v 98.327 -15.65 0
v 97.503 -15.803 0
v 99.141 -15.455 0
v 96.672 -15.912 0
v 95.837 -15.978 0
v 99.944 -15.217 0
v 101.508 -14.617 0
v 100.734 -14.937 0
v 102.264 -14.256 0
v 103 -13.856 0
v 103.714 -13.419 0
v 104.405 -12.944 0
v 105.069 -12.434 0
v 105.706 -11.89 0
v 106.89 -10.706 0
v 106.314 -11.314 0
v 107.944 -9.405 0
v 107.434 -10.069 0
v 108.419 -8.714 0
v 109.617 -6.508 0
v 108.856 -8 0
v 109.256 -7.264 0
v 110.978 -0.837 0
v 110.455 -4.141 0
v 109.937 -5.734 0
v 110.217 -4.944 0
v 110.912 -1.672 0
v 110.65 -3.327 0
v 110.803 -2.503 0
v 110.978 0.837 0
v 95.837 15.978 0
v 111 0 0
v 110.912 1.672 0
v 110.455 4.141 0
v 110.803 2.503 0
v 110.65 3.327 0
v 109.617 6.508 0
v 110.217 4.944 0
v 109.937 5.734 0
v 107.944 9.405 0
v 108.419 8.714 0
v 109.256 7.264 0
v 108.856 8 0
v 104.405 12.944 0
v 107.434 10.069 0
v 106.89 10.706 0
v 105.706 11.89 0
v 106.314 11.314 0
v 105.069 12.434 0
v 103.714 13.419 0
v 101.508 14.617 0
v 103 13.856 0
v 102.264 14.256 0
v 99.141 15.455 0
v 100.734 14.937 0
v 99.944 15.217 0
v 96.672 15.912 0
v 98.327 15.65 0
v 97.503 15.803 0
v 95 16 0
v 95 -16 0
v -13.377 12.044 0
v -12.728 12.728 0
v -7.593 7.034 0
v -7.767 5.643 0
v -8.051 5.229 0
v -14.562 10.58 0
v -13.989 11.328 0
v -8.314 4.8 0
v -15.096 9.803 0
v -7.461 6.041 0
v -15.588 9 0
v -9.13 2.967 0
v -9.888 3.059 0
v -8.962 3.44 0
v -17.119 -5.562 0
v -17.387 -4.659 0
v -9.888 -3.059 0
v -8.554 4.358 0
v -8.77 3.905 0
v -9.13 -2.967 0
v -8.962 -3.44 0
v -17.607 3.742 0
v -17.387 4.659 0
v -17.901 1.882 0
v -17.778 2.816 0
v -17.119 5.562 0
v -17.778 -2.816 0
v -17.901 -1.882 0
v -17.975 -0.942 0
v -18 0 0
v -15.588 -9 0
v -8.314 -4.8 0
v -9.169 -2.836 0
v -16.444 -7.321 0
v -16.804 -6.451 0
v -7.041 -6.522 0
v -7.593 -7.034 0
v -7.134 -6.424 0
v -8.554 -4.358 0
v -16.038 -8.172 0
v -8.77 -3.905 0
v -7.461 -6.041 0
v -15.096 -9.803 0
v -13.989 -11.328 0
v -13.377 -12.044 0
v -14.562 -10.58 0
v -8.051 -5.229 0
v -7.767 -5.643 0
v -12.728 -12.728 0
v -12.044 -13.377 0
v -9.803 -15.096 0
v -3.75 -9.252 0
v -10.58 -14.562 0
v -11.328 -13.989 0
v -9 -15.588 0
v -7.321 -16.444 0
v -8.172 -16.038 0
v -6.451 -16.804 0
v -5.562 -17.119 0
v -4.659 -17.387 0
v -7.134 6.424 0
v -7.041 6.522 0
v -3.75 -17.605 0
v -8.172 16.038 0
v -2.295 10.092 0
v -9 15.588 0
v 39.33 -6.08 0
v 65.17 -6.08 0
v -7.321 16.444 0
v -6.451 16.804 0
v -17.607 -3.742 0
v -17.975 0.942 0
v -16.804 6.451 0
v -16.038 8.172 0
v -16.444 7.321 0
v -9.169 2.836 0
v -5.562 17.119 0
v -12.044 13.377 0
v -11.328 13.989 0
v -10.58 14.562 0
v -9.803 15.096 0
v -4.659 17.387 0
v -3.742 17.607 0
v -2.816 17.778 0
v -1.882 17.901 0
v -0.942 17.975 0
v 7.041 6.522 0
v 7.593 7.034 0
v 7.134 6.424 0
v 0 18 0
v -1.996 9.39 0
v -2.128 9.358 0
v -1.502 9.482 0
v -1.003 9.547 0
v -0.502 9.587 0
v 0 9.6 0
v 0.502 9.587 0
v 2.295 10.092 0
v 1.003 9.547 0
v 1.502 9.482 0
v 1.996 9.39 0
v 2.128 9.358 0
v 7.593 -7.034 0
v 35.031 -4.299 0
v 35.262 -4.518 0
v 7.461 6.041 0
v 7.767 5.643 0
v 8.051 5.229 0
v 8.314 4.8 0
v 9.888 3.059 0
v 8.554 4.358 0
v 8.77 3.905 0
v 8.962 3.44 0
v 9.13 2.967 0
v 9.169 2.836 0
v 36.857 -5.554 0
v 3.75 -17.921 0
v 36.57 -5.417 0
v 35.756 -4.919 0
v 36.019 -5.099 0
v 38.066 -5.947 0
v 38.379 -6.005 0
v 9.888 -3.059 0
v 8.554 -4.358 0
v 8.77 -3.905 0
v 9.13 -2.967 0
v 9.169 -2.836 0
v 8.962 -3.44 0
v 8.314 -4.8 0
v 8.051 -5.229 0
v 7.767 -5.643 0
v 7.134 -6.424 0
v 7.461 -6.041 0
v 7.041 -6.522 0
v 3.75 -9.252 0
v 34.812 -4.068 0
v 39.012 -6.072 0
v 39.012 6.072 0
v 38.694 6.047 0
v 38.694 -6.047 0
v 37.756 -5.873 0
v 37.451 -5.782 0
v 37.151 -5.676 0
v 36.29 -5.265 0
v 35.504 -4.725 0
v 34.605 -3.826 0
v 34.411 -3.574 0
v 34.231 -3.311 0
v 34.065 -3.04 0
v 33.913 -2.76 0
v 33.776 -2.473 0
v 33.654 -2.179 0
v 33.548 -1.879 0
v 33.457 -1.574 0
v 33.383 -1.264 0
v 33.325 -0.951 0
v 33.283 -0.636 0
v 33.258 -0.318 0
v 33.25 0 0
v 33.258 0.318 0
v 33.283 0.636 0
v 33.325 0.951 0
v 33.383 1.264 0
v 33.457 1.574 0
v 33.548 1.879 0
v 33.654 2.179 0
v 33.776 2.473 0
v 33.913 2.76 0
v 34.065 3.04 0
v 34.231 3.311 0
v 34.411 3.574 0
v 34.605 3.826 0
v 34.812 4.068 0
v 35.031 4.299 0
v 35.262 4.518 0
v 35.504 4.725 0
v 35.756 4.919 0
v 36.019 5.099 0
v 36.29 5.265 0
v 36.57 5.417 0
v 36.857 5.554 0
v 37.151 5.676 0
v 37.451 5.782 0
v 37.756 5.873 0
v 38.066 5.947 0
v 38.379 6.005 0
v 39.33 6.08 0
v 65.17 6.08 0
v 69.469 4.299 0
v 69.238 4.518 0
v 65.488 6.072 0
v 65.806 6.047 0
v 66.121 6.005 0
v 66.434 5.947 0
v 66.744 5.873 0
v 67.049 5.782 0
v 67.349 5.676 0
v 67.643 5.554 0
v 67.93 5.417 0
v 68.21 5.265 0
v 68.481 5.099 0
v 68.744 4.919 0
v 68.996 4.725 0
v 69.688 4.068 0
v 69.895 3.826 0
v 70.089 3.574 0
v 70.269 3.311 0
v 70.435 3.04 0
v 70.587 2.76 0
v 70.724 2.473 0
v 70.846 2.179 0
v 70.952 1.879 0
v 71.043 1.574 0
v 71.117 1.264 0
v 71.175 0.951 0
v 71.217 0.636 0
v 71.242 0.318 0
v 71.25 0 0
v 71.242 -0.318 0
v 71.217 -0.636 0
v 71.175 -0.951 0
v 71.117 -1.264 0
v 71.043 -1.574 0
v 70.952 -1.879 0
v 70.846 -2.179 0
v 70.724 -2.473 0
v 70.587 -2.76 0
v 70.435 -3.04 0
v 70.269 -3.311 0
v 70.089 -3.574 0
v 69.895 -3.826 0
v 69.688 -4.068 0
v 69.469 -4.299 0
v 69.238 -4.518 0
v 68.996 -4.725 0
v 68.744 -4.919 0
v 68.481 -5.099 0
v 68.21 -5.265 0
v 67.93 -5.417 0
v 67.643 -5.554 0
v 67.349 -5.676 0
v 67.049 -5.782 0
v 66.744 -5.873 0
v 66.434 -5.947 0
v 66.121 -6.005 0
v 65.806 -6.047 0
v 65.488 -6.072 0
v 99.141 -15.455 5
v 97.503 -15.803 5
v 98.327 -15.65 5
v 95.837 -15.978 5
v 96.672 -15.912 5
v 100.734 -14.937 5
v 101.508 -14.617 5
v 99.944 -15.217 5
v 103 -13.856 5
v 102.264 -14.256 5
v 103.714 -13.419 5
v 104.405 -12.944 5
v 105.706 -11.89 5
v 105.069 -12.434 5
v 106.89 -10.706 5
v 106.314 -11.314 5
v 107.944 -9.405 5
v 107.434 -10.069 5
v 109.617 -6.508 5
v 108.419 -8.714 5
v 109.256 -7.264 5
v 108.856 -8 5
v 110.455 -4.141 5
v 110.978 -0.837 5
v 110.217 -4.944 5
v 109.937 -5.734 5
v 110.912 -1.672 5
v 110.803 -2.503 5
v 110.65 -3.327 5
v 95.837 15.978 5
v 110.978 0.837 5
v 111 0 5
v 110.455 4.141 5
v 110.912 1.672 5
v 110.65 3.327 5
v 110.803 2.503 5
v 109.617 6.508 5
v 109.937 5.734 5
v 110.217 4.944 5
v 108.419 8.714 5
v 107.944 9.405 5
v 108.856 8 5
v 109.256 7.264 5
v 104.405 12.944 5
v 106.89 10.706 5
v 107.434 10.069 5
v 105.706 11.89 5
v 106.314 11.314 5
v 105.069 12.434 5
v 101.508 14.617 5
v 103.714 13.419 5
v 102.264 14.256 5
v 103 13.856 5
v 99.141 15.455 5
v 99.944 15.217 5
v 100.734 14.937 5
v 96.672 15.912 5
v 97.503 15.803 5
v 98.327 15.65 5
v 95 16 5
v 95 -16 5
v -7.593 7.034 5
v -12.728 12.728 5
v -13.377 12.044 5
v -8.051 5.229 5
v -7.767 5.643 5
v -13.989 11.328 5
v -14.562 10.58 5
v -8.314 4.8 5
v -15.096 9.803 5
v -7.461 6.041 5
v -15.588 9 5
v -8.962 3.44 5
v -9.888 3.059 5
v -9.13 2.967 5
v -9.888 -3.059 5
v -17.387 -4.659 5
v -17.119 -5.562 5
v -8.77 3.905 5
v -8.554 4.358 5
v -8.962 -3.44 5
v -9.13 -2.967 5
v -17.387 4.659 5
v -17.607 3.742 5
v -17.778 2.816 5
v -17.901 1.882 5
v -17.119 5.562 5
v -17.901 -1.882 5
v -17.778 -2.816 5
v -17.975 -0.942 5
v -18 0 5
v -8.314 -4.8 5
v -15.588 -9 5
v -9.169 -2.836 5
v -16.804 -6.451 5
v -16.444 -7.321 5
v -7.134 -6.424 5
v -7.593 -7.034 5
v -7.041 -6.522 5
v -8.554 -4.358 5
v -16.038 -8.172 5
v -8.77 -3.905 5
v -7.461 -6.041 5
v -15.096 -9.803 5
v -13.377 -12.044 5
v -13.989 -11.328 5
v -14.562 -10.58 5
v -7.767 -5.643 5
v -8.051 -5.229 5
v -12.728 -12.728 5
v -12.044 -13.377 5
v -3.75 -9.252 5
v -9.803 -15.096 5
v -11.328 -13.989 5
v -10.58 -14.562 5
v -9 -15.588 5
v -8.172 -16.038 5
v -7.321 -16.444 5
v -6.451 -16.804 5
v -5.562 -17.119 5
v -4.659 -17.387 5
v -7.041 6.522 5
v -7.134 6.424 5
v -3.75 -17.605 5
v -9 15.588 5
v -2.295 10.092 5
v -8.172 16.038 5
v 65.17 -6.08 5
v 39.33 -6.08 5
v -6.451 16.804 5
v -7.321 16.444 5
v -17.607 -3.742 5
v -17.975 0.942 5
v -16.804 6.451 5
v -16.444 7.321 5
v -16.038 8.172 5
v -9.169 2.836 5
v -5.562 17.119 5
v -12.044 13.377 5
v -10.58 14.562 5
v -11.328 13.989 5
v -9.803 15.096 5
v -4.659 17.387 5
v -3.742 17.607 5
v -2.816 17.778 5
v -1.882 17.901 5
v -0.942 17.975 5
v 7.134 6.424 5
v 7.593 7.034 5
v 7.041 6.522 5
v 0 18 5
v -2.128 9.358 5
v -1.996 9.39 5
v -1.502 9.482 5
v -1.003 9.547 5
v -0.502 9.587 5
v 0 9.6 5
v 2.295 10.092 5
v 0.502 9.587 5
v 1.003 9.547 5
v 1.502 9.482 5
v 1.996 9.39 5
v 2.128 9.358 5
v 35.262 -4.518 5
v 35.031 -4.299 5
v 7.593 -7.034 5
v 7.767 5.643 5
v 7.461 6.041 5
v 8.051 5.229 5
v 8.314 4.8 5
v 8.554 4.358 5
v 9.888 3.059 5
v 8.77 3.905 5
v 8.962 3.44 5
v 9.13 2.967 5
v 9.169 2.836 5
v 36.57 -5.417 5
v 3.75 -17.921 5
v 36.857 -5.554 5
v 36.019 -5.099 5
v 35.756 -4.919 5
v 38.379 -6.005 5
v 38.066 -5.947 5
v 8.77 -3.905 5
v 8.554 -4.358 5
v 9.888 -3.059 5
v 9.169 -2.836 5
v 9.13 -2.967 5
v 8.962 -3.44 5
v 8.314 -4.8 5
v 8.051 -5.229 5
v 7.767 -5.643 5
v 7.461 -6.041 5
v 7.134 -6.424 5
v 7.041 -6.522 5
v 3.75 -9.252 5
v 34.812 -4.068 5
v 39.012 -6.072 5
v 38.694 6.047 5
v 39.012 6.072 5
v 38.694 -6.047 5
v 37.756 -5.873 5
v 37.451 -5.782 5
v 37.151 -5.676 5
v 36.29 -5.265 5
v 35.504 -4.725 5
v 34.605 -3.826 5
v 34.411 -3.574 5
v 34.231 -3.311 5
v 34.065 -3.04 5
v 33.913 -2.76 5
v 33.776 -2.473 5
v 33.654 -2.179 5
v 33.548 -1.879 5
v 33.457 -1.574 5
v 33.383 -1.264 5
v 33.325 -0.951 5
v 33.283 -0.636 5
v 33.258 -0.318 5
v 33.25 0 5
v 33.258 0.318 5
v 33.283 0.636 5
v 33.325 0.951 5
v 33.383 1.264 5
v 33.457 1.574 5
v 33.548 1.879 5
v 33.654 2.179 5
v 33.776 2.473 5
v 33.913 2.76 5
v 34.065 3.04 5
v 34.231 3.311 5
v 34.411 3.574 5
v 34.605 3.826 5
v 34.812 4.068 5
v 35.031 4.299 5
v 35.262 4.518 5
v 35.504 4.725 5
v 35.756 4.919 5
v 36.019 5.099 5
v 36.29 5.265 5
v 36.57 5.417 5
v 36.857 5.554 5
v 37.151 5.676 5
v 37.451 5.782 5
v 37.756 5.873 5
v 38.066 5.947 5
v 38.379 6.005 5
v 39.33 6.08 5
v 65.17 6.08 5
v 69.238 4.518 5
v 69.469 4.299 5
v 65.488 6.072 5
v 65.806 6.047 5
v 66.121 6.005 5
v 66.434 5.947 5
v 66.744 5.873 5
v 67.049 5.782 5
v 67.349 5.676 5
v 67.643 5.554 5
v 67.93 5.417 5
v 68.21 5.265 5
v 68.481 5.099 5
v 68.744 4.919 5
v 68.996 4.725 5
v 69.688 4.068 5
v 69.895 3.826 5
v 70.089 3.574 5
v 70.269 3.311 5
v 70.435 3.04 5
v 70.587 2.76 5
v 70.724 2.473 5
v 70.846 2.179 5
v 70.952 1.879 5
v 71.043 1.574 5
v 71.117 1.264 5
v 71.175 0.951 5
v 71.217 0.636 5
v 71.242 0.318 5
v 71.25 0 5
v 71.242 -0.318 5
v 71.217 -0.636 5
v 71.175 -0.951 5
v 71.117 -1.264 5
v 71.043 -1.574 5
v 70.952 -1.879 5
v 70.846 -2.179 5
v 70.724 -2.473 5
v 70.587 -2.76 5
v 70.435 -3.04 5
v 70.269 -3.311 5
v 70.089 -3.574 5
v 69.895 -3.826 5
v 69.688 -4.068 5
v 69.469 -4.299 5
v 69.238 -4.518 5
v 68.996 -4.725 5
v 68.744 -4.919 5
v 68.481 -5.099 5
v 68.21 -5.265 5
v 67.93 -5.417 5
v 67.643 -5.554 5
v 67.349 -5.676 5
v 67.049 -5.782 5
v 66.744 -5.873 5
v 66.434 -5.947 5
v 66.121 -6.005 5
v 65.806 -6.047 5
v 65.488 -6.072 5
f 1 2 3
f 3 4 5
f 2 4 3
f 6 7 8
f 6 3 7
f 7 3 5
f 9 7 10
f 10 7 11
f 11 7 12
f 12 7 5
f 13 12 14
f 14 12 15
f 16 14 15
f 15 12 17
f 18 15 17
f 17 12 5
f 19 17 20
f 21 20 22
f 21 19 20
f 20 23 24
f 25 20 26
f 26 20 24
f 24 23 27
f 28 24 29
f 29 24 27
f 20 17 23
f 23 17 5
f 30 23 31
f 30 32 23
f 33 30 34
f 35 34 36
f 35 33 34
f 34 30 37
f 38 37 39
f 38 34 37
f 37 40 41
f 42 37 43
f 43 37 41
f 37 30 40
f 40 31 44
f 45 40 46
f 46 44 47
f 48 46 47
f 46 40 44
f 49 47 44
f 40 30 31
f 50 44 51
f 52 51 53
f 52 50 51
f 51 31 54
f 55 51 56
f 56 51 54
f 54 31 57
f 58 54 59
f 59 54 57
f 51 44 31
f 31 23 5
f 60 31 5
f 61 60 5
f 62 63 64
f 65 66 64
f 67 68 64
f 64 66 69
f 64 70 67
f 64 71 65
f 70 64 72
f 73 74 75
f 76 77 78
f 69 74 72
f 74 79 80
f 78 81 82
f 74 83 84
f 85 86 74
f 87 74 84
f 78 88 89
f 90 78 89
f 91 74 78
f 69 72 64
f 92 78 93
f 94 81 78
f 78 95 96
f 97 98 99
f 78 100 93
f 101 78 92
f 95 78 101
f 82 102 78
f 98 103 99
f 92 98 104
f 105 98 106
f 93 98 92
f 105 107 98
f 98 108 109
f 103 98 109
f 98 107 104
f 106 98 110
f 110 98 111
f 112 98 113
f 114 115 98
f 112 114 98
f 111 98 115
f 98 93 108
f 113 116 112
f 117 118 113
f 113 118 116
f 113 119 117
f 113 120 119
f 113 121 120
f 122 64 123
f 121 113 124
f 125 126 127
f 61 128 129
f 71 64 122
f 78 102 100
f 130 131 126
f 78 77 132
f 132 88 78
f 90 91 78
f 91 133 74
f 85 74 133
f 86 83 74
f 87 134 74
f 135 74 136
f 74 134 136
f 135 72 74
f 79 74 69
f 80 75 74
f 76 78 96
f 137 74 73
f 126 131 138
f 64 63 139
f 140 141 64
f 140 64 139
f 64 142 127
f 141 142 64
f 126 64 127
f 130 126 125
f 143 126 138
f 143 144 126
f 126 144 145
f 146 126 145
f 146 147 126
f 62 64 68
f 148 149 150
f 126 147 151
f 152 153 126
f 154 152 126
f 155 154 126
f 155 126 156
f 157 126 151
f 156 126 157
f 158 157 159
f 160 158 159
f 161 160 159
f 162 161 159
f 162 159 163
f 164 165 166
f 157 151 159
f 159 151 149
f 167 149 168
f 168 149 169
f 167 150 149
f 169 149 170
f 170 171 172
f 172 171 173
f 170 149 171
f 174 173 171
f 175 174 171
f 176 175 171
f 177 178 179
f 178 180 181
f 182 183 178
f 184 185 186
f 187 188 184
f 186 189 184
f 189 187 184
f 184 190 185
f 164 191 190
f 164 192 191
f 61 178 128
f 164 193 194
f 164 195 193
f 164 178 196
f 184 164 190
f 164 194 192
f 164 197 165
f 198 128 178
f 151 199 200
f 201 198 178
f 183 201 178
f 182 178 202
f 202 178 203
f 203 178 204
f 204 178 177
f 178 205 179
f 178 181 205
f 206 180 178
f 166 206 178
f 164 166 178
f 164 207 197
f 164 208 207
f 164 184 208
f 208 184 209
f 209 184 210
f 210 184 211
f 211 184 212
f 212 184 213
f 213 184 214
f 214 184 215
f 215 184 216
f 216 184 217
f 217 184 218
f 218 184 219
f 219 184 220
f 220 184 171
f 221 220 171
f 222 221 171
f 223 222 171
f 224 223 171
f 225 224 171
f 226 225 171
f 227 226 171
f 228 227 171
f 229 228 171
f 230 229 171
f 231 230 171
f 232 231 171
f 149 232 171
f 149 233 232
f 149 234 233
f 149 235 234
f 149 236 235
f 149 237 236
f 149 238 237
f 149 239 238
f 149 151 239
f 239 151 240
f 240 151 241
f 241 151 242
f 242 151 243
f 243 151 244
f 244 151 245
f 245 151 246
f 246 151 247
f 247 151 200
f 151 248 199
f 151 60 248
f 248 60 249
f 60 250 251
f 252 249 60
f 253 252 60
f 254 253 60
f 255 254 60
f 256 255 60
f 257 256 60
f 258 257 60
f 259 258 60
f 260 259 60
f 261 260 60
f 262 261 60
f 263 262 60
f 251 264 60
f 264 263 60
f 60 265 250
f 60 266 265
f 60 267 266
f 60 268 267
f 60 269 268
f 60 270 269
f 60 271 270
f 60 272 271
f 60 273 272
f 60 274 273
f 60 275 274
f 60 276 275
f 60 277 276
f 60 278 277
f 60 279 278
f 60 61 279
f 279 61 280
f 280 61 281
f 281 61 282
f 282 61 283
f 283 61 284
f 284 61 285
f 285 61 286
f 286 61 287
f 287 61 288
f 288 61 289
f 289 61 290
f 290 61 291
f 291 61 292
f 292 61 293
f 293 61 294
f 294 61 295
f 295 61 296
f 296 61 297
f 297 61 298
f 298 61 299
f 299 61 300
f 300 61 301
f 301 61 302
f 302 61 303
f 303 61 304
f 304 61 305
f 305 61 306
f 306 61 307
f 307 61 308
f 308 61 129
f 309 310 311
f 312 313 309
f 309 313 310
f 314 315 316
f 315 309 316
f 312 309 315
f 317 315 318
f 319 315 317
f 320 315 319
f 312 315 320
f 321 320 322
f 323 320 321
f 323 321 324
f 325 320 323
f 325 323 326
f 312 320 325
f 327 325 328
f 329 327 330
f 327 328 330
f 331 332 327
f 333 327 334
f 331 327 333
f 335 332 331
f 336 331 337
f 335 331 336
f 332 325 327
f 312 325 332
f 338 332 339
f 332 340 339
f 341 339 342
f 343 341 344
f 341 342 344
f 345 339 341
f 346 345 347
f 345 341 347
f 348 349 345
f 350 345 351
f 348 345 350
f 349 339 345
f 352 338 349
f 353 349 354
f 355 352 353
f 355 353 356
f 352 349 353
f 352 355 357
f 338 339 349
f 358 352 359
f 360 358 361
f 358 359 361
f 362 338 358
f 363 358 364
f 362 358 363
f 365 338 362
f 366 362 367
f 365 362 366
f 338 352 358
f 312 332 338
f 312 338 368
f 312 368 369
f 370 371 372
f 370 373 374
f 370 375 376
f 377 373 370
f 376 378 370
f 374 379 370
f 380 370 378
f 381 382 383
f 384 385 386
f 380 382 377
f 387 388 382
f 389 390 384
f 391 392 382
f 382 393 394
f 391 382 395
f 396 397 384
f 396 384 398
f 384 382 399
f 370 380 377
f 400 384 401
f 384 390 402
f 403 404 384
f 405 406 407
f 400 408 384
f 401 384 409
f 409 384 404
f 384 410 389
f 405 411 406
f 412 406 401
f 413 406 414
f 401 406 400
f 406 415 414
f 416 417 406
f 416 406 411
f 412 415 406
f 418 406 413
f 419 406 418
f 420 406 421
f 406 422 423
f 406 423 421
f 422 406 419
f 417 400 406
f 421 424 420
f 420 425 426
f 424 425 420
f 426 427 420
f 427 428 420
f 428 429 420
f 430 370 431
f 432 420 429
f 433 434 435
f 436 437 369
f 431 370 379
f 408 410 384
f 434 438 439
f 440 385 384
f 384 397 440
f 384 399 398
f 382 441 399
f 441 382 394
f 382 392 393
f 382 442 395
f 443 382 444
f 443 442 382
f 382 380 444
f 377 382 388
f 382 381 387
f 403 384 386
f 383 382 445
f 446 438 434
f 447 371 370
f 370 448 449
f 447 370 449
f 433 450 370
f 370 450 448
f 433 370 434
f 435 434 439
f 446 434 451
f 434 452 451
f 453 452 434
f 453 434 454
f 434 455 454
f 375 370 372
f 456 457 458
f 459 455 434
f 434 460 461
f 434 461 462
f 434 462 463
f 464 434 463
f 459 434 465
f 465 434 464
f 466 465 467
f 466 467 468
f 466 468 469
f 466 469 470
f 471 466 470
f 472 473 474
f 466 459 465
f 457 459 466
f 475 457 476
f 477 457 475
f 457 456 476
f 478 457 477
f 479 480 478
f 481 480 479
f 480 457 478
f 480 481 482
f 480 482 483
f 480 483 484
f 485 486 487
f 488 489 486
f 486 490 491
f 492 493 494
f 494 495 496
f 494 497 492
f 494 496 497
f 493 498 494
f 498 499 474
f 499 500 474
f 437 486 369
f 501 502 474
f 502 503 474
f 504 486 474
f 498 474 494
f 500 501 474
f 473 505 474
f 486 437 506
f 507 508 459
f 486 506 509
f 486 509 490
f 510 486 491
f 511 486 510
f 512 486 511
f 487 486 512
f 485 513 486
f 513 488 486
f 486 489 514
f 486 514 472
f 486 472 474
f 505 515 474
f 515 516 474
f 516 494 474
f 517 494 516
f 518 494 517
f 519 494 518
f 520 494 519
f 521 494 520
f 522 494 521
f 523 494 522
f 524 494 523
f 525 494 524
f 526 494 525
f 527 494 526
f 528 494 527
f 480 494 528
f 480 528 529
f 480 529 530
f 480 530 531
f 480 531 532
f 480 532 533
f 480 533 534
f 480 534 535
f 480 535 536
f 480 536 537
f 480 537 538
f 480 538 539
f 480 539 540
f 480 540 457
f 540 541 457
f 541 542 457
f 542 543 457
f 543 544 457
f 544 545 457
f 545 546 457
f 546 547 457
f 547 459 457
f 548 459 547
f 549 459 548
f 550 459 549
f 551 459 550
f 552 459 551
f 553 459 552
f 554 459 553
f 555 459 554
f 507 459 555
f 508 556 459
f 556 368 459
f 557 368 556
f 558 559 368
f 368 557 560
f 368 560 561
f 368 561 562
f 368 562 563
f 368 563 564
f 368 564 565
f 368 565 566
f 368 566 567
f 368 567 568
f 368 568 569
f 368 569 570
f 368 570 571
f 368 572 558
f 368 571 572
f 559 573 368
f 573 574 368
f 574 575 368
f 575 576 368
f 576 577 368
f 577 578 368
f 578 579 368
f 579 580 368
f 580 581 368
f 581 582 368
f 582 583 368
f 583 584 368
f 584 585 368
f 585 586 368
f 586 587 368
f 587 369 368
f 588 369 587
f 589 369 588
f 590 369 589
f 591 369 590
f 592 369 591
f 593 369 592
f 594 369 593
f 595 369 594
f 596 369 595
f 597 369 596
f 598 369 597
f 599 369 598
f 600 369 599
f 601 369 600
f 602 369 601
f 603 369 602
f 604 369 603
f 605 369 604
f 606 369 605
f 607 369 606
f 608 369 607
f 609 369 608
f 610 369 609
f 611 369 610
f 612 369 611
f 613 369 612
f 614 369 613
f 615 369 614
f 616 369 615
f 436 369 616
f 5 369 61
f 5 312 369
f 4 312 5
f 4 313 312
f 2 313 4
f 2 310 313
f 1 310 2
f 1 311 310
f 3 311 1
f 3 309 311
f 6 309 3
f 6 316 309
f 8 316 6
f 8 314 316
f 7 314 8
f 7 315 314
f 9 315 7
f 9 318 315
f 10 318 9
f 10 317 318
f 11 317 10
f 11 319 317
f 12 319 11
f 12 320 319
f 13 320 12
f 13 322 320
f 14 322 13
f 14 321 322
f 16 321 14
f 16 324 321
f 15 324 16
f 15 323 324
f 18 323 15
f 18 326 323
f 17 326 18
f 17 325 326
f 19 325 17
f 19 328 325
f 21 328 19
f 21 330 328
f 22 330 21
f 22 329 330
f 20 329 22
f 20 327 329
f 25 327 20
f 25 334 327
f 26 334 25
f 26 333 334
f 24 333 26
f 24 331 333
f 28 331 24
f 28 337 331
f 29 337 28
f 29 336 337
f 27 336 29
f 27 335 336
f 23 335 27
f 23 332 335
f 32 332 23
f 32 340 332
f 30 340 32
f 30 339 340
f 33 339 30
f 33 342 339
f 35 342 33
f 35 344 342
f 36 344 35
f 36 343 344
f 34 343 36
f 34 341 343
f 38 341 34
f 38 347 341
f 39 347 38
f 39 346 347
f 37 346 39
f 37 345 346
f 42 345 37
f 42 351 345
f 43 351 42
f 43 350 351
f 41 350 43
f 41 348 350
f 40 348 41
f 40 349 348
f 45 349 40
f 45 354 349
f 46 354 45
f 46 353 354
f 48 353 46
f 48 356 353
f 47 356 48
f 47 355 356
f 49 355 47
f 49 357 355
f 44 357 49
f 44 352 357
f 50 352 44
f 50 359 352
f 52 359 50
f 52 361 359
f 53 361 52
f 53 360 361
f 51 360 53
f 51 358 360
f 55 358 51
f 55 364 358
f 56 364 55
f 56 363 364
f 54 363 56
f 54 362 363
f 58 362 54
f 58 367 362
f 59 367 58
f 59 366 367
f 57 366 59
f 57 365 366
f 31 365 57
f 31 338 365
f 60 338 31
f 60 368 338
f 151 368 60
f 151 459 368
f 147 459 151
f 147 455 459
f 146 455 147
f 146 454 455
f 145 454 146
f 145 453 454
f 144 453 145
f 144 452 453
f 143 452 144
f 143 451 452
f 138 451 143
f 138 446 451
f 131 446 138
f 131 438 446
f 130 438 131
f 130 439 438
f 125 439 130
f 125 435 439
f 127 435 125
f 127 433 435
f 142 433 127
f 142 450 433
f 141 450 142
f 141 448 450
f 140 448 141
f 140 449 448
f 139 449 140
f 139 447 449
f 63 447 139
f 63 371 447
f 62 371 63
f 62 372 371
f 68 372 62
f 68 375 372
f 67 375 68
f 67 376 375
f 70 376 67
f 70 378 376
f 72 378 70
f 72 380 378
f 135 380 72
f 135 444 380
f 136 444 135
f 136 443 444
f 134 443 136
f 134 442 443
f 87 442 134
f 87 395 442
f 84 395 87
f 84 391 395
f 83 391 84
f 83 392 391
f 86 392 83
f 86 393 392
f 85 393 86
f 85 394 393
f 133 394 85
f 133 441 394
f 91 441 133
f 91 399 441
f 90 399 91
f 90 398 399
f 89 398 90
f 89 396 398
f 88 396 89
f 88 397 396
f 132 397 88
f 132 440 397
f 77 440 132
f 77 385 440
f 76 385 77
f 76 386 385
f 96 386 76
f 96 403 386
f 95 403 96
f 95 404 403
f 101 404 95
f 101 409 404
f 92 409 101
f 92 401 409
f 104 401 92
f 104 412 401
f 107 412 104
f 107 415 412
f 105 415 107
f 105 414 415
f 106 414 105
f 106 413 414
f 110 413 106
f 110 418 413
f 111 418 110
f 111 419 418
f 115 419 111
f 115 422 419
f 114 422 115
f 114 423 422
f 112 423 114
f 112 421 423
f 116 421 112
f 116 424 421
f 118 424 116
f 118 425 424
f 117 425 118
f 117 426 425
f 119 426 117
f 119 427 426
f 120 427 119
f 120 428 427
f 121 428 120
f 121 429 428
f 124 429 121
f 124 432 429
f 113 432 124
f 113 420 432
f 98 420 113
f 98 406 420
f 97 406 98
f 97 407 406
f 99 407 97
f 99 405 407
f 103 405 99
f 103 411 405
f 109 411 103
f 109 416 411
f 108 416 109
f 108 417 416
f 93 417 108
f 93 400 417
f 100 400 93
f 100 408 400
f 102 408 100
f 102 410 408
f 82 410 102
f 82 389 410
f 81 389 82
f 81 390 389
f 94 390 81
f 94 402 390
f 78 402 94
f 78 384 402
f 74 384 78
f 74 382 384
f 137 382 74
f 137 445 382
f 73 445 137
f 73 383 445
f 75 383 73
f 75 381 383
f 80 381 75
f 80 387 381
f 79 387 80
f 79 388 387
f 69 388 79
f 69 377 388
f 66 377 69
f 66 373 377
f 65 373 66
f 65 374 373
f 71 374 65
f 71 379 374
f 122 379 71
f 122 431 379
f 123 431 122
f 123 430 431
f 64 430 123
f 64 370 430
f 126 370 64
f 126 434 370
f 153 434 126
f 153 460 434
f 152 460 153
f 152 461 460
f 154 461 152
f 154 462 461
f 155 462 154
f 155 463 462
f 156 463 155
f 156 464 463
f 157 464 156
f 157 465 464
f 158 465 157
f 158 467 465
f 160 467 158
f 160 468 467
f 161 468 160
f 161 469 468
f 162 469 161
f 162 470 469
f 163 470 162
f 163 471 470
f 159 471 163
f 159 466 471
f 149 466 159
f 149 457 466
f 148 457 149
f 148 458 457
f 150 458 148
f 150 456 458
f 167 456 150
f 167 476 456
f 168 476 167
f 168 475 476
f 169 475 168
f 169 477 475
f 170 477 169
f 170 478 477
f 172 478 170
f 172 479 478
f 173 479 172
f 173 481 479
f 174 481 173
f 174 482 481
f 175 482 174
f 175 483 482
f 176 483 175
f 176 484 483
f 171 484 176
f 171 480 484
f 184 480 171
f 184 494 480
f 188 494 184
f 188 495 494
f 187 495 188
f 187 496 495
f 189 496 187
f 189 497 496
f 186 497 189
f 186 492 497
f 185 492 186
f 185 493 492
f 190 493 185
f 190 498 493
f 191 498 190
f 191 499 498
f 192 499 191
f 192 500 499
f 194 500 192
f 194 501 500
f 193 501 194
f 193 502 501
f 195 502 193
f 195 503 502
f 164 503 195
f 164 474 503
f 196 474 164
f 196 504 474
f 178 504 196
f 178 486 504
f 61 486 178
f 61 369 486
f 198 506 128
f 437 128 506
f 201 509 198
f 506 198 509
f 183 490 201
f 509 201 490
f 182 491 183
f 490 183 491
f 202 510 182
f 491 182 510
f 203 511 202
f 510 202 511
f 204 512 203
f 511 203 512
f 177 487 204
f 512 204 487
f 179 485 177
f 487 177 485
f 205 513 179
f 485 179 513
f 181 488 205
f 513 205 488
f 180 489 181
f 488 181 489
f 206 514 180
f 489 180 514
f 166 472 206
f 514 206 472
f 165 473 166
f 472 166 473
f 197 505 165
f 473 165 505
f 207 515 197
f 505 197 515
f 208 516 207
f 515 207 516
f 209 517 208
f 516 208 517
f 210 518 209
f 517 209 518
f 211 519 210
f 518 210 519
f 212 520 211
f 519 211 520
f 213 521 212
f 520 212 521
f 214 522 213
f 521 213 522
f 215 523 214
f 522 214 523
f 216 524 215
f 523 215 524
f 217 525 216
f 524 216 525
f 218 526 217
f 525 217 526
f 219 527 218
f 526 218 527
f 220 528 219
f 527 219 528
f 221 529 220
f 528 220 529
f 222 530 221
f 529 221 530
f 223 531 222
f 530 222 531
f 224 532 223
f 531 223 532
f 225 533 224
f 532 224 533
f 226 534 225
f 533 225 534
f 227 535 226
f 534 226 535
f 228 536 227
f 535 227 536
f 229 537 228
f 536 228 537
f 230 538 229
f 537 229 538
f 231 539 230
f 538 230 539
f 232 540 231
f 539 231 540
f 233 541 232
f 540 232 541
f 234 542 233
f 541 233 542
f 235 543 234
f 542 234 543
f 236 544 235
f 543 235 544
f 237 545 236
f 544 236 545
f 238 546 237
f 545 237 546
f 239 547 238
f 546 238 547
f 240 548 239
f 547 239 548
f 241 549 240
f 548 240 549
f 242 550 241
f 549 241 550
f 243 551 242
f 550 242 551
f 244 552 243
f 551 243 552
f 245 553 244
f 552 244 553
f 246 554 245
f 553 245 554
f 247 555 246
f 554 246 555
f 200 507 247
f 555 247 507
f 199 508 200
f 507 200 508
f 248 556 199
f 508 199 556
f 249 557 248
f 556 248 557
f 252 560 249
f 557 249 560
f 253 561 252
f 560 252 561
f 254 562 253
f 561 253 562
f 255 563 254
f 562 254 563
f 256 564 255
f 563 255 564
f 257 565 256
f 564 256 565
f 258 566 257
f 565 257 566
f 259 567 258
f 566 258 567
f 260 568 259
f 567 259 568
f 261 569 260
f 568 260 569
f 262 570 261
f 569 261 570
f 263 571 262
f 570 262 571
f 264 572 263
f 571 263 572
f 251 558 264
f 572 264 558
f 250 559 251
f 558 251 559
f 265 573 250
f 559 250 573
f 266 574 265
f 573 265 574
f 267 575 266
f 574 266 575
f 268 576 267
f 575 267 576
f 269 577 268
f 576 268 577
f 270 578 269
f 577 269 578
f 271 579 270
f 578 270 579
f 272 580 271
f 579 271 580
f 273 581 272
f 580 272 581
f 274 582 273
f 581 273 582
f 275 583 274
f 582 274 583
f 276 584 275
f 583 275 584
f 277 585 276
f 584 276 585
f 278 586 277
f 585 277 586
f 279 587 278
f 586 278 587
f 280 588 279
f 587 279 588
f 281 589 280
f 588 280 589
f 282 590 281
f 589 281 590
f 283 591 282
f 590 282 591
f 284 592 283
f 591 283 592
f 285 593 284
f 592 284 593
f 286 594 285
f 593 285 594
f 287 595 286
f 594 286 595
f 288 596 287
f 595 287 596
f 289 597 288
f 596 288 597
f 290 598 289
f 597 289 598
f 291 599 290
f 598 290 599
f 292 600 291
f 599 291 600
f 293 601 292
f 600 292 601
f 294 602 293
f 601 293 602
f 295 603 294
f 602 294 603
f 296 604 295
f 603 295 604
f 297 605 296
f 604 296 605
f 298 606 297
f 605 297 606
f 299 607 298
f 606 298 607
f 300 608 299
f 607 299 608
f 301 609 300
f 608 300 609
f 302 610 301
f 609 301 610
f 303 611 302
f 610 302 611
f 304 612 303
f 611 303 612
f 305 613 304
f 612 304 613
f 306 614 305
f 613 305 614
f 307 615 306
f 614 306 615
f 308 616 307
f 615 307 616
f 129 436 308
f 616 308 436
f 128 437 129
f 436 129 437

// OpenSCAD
// =====================================================================
// File: MC4-Spanner.scad
// Title: Parametric & Modular MC4 Solar Connector Spanner
// Version: v0.01
// Description: Parametric OpenSCAD model for solar PV connectors.
//              Initial module configured for Morek MC4 1500V.
// =====================================================================

// --- VERSION & METADATA ---
// Version: v0.01

// --- PARAMETERS ---
$fn = 120; // High resolution for smooth curved surfaces

// Spanner body dimensions
spanner_thickness = 5.0;  // Thickness of the wrench body (mm)
handle_length = 95.0;     // Length of the handle (mm)
handle_width = 32.0;      // Width of the handle grip (mm)
head_radius = 18.0;       // Outer radius of the wrench head end (mm)

// Morek MC4 1500V Connector Parameters
connector_od = 20.0;        // Outer diameter (mm)
connector_minor_d = 18.5;   // Minor diameter (mm)
elevated_arc_len = 6.0;     // Elevated section arc length on surface (mm)
num_lobes = 6;              // Repeating locking/grip lobes
tolerance = 0.35;           // 3D printer clearance tolerance (mm)
cable_slot_width = 7.5;     // Side opening slot to slip spanner over cable (mm)

// --- MODULES ---

// Module: Morek MC4 1500V Wrench Head Profile Cutout
module morek_mc4_head_cutout() {
    r_outer = (connector_od / 2) + tolerance;
    r_minor = (connector_minor_d / 2) + tolerance;
    
    // Calculate angular width of the elevated section in degrees
    elevated_angle = (elevated_arc_len / (connector_od / 2)) * (180 / PI);

    union() {
        // Center multi-point socket profile combining minor diameter and elevated teeth
        intersection() {
            circle(r = r_outer + 0.5);
            
            union() {
                // Minor diameter base circle
                circle(r = r_minor);
                
                // Elevated gripping sections (lobes)
                for (i = [0 : num_lobes - 1]) {
                    rotate([0, 0, i * (360 / num_lobes)]) {
                        polygon(points=[
                            [0, 0],
                            [r_outer * cos(-elevated_angle/2), r_outer * sin(-elevated_angle/2)],
                            [r_outer * cos(elevated_angle/2), r_outer * sin(elevated_angle/2)]
                        ]);
                    }
                }
            }
        }
        
        // Cable entry slot to allow sliding sideways onto connector/cable
        translate([0, -r_outer * 2.5, 0])
            square([cable_slot_width, r_outer * 5], center = true);
    }
}

// Module: Main Parametric MC4 Spanner Body
module mc4_spanner() {
    linear_extrude(height = spanner_thickness, convexity = 5) {
        difference() {
            // Ergonomic wrench outline (hull between head and handle grip)
            hull() {
                // Wrench head end
                translate([0, 0, 0])
                    circle(r = head_radius);
                
                // Handle end grip
                translate([handle_length, 0, 0])
                    circle(r = handle_width / 2);
            }
            
            // Subtract connector profile cutout
            morek_mc4_head_cutout();
            
            // Weight-reduction pocket / finger grip slot in handle
            translate([handle_length * 0.55, 0, 0])
                pill_shape(handle_length * 0.4, handle_width * 0.38);
        }
    }
}

// Helper: Pill-shaped cutout for handle weight reduction
module pill_shape(l, w) {
    hull() {
        translate([-l/2 + w/2, 0, 0]) circle(r = w/2);
        translate([l/2 - w/2, 0, 0]) circle(r = w/2);
    }
}

// --- RENDER ---
mc4_spanner();
